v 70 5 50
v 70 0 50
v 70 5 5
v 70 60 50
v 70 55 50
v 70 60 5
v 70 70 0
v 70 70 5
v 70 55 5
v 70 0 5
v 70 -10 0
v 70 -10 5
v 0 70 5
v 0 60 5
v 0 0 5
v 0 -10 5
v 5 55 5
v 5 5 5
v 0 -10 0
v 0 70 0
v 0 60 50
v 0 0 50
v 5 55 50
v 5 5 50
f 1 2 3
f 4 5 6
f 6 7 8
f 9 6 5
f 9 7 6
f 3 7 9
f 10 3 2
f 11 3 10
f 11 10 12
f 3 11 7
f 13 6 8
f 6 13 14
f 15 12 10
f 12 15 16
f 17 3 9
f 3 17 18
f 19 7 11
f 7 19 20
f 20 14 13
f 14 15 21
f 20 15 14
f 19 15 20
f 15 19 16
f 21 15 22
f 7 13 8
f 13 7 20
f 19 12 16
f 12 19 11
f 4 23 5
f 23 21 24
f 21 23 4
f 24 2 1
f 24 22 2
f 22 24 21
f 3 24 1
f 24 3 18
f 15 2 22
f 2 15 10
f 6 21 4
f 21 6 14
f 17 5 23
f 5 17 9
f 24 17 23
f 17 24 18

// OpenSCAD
t=5;    // thickness
width=70;
depth=60;
heigth=50;

translate([0, -10, 0]) {
    cube(size=[width, depth + 20, t], center=false);
}
cube(size=[width, t, heigth], center=false);
translate([0, depth - t, 0]) cube(size=[width, t, heigth], center=false);
cube(size=[t, depth, heigth], center=false);
